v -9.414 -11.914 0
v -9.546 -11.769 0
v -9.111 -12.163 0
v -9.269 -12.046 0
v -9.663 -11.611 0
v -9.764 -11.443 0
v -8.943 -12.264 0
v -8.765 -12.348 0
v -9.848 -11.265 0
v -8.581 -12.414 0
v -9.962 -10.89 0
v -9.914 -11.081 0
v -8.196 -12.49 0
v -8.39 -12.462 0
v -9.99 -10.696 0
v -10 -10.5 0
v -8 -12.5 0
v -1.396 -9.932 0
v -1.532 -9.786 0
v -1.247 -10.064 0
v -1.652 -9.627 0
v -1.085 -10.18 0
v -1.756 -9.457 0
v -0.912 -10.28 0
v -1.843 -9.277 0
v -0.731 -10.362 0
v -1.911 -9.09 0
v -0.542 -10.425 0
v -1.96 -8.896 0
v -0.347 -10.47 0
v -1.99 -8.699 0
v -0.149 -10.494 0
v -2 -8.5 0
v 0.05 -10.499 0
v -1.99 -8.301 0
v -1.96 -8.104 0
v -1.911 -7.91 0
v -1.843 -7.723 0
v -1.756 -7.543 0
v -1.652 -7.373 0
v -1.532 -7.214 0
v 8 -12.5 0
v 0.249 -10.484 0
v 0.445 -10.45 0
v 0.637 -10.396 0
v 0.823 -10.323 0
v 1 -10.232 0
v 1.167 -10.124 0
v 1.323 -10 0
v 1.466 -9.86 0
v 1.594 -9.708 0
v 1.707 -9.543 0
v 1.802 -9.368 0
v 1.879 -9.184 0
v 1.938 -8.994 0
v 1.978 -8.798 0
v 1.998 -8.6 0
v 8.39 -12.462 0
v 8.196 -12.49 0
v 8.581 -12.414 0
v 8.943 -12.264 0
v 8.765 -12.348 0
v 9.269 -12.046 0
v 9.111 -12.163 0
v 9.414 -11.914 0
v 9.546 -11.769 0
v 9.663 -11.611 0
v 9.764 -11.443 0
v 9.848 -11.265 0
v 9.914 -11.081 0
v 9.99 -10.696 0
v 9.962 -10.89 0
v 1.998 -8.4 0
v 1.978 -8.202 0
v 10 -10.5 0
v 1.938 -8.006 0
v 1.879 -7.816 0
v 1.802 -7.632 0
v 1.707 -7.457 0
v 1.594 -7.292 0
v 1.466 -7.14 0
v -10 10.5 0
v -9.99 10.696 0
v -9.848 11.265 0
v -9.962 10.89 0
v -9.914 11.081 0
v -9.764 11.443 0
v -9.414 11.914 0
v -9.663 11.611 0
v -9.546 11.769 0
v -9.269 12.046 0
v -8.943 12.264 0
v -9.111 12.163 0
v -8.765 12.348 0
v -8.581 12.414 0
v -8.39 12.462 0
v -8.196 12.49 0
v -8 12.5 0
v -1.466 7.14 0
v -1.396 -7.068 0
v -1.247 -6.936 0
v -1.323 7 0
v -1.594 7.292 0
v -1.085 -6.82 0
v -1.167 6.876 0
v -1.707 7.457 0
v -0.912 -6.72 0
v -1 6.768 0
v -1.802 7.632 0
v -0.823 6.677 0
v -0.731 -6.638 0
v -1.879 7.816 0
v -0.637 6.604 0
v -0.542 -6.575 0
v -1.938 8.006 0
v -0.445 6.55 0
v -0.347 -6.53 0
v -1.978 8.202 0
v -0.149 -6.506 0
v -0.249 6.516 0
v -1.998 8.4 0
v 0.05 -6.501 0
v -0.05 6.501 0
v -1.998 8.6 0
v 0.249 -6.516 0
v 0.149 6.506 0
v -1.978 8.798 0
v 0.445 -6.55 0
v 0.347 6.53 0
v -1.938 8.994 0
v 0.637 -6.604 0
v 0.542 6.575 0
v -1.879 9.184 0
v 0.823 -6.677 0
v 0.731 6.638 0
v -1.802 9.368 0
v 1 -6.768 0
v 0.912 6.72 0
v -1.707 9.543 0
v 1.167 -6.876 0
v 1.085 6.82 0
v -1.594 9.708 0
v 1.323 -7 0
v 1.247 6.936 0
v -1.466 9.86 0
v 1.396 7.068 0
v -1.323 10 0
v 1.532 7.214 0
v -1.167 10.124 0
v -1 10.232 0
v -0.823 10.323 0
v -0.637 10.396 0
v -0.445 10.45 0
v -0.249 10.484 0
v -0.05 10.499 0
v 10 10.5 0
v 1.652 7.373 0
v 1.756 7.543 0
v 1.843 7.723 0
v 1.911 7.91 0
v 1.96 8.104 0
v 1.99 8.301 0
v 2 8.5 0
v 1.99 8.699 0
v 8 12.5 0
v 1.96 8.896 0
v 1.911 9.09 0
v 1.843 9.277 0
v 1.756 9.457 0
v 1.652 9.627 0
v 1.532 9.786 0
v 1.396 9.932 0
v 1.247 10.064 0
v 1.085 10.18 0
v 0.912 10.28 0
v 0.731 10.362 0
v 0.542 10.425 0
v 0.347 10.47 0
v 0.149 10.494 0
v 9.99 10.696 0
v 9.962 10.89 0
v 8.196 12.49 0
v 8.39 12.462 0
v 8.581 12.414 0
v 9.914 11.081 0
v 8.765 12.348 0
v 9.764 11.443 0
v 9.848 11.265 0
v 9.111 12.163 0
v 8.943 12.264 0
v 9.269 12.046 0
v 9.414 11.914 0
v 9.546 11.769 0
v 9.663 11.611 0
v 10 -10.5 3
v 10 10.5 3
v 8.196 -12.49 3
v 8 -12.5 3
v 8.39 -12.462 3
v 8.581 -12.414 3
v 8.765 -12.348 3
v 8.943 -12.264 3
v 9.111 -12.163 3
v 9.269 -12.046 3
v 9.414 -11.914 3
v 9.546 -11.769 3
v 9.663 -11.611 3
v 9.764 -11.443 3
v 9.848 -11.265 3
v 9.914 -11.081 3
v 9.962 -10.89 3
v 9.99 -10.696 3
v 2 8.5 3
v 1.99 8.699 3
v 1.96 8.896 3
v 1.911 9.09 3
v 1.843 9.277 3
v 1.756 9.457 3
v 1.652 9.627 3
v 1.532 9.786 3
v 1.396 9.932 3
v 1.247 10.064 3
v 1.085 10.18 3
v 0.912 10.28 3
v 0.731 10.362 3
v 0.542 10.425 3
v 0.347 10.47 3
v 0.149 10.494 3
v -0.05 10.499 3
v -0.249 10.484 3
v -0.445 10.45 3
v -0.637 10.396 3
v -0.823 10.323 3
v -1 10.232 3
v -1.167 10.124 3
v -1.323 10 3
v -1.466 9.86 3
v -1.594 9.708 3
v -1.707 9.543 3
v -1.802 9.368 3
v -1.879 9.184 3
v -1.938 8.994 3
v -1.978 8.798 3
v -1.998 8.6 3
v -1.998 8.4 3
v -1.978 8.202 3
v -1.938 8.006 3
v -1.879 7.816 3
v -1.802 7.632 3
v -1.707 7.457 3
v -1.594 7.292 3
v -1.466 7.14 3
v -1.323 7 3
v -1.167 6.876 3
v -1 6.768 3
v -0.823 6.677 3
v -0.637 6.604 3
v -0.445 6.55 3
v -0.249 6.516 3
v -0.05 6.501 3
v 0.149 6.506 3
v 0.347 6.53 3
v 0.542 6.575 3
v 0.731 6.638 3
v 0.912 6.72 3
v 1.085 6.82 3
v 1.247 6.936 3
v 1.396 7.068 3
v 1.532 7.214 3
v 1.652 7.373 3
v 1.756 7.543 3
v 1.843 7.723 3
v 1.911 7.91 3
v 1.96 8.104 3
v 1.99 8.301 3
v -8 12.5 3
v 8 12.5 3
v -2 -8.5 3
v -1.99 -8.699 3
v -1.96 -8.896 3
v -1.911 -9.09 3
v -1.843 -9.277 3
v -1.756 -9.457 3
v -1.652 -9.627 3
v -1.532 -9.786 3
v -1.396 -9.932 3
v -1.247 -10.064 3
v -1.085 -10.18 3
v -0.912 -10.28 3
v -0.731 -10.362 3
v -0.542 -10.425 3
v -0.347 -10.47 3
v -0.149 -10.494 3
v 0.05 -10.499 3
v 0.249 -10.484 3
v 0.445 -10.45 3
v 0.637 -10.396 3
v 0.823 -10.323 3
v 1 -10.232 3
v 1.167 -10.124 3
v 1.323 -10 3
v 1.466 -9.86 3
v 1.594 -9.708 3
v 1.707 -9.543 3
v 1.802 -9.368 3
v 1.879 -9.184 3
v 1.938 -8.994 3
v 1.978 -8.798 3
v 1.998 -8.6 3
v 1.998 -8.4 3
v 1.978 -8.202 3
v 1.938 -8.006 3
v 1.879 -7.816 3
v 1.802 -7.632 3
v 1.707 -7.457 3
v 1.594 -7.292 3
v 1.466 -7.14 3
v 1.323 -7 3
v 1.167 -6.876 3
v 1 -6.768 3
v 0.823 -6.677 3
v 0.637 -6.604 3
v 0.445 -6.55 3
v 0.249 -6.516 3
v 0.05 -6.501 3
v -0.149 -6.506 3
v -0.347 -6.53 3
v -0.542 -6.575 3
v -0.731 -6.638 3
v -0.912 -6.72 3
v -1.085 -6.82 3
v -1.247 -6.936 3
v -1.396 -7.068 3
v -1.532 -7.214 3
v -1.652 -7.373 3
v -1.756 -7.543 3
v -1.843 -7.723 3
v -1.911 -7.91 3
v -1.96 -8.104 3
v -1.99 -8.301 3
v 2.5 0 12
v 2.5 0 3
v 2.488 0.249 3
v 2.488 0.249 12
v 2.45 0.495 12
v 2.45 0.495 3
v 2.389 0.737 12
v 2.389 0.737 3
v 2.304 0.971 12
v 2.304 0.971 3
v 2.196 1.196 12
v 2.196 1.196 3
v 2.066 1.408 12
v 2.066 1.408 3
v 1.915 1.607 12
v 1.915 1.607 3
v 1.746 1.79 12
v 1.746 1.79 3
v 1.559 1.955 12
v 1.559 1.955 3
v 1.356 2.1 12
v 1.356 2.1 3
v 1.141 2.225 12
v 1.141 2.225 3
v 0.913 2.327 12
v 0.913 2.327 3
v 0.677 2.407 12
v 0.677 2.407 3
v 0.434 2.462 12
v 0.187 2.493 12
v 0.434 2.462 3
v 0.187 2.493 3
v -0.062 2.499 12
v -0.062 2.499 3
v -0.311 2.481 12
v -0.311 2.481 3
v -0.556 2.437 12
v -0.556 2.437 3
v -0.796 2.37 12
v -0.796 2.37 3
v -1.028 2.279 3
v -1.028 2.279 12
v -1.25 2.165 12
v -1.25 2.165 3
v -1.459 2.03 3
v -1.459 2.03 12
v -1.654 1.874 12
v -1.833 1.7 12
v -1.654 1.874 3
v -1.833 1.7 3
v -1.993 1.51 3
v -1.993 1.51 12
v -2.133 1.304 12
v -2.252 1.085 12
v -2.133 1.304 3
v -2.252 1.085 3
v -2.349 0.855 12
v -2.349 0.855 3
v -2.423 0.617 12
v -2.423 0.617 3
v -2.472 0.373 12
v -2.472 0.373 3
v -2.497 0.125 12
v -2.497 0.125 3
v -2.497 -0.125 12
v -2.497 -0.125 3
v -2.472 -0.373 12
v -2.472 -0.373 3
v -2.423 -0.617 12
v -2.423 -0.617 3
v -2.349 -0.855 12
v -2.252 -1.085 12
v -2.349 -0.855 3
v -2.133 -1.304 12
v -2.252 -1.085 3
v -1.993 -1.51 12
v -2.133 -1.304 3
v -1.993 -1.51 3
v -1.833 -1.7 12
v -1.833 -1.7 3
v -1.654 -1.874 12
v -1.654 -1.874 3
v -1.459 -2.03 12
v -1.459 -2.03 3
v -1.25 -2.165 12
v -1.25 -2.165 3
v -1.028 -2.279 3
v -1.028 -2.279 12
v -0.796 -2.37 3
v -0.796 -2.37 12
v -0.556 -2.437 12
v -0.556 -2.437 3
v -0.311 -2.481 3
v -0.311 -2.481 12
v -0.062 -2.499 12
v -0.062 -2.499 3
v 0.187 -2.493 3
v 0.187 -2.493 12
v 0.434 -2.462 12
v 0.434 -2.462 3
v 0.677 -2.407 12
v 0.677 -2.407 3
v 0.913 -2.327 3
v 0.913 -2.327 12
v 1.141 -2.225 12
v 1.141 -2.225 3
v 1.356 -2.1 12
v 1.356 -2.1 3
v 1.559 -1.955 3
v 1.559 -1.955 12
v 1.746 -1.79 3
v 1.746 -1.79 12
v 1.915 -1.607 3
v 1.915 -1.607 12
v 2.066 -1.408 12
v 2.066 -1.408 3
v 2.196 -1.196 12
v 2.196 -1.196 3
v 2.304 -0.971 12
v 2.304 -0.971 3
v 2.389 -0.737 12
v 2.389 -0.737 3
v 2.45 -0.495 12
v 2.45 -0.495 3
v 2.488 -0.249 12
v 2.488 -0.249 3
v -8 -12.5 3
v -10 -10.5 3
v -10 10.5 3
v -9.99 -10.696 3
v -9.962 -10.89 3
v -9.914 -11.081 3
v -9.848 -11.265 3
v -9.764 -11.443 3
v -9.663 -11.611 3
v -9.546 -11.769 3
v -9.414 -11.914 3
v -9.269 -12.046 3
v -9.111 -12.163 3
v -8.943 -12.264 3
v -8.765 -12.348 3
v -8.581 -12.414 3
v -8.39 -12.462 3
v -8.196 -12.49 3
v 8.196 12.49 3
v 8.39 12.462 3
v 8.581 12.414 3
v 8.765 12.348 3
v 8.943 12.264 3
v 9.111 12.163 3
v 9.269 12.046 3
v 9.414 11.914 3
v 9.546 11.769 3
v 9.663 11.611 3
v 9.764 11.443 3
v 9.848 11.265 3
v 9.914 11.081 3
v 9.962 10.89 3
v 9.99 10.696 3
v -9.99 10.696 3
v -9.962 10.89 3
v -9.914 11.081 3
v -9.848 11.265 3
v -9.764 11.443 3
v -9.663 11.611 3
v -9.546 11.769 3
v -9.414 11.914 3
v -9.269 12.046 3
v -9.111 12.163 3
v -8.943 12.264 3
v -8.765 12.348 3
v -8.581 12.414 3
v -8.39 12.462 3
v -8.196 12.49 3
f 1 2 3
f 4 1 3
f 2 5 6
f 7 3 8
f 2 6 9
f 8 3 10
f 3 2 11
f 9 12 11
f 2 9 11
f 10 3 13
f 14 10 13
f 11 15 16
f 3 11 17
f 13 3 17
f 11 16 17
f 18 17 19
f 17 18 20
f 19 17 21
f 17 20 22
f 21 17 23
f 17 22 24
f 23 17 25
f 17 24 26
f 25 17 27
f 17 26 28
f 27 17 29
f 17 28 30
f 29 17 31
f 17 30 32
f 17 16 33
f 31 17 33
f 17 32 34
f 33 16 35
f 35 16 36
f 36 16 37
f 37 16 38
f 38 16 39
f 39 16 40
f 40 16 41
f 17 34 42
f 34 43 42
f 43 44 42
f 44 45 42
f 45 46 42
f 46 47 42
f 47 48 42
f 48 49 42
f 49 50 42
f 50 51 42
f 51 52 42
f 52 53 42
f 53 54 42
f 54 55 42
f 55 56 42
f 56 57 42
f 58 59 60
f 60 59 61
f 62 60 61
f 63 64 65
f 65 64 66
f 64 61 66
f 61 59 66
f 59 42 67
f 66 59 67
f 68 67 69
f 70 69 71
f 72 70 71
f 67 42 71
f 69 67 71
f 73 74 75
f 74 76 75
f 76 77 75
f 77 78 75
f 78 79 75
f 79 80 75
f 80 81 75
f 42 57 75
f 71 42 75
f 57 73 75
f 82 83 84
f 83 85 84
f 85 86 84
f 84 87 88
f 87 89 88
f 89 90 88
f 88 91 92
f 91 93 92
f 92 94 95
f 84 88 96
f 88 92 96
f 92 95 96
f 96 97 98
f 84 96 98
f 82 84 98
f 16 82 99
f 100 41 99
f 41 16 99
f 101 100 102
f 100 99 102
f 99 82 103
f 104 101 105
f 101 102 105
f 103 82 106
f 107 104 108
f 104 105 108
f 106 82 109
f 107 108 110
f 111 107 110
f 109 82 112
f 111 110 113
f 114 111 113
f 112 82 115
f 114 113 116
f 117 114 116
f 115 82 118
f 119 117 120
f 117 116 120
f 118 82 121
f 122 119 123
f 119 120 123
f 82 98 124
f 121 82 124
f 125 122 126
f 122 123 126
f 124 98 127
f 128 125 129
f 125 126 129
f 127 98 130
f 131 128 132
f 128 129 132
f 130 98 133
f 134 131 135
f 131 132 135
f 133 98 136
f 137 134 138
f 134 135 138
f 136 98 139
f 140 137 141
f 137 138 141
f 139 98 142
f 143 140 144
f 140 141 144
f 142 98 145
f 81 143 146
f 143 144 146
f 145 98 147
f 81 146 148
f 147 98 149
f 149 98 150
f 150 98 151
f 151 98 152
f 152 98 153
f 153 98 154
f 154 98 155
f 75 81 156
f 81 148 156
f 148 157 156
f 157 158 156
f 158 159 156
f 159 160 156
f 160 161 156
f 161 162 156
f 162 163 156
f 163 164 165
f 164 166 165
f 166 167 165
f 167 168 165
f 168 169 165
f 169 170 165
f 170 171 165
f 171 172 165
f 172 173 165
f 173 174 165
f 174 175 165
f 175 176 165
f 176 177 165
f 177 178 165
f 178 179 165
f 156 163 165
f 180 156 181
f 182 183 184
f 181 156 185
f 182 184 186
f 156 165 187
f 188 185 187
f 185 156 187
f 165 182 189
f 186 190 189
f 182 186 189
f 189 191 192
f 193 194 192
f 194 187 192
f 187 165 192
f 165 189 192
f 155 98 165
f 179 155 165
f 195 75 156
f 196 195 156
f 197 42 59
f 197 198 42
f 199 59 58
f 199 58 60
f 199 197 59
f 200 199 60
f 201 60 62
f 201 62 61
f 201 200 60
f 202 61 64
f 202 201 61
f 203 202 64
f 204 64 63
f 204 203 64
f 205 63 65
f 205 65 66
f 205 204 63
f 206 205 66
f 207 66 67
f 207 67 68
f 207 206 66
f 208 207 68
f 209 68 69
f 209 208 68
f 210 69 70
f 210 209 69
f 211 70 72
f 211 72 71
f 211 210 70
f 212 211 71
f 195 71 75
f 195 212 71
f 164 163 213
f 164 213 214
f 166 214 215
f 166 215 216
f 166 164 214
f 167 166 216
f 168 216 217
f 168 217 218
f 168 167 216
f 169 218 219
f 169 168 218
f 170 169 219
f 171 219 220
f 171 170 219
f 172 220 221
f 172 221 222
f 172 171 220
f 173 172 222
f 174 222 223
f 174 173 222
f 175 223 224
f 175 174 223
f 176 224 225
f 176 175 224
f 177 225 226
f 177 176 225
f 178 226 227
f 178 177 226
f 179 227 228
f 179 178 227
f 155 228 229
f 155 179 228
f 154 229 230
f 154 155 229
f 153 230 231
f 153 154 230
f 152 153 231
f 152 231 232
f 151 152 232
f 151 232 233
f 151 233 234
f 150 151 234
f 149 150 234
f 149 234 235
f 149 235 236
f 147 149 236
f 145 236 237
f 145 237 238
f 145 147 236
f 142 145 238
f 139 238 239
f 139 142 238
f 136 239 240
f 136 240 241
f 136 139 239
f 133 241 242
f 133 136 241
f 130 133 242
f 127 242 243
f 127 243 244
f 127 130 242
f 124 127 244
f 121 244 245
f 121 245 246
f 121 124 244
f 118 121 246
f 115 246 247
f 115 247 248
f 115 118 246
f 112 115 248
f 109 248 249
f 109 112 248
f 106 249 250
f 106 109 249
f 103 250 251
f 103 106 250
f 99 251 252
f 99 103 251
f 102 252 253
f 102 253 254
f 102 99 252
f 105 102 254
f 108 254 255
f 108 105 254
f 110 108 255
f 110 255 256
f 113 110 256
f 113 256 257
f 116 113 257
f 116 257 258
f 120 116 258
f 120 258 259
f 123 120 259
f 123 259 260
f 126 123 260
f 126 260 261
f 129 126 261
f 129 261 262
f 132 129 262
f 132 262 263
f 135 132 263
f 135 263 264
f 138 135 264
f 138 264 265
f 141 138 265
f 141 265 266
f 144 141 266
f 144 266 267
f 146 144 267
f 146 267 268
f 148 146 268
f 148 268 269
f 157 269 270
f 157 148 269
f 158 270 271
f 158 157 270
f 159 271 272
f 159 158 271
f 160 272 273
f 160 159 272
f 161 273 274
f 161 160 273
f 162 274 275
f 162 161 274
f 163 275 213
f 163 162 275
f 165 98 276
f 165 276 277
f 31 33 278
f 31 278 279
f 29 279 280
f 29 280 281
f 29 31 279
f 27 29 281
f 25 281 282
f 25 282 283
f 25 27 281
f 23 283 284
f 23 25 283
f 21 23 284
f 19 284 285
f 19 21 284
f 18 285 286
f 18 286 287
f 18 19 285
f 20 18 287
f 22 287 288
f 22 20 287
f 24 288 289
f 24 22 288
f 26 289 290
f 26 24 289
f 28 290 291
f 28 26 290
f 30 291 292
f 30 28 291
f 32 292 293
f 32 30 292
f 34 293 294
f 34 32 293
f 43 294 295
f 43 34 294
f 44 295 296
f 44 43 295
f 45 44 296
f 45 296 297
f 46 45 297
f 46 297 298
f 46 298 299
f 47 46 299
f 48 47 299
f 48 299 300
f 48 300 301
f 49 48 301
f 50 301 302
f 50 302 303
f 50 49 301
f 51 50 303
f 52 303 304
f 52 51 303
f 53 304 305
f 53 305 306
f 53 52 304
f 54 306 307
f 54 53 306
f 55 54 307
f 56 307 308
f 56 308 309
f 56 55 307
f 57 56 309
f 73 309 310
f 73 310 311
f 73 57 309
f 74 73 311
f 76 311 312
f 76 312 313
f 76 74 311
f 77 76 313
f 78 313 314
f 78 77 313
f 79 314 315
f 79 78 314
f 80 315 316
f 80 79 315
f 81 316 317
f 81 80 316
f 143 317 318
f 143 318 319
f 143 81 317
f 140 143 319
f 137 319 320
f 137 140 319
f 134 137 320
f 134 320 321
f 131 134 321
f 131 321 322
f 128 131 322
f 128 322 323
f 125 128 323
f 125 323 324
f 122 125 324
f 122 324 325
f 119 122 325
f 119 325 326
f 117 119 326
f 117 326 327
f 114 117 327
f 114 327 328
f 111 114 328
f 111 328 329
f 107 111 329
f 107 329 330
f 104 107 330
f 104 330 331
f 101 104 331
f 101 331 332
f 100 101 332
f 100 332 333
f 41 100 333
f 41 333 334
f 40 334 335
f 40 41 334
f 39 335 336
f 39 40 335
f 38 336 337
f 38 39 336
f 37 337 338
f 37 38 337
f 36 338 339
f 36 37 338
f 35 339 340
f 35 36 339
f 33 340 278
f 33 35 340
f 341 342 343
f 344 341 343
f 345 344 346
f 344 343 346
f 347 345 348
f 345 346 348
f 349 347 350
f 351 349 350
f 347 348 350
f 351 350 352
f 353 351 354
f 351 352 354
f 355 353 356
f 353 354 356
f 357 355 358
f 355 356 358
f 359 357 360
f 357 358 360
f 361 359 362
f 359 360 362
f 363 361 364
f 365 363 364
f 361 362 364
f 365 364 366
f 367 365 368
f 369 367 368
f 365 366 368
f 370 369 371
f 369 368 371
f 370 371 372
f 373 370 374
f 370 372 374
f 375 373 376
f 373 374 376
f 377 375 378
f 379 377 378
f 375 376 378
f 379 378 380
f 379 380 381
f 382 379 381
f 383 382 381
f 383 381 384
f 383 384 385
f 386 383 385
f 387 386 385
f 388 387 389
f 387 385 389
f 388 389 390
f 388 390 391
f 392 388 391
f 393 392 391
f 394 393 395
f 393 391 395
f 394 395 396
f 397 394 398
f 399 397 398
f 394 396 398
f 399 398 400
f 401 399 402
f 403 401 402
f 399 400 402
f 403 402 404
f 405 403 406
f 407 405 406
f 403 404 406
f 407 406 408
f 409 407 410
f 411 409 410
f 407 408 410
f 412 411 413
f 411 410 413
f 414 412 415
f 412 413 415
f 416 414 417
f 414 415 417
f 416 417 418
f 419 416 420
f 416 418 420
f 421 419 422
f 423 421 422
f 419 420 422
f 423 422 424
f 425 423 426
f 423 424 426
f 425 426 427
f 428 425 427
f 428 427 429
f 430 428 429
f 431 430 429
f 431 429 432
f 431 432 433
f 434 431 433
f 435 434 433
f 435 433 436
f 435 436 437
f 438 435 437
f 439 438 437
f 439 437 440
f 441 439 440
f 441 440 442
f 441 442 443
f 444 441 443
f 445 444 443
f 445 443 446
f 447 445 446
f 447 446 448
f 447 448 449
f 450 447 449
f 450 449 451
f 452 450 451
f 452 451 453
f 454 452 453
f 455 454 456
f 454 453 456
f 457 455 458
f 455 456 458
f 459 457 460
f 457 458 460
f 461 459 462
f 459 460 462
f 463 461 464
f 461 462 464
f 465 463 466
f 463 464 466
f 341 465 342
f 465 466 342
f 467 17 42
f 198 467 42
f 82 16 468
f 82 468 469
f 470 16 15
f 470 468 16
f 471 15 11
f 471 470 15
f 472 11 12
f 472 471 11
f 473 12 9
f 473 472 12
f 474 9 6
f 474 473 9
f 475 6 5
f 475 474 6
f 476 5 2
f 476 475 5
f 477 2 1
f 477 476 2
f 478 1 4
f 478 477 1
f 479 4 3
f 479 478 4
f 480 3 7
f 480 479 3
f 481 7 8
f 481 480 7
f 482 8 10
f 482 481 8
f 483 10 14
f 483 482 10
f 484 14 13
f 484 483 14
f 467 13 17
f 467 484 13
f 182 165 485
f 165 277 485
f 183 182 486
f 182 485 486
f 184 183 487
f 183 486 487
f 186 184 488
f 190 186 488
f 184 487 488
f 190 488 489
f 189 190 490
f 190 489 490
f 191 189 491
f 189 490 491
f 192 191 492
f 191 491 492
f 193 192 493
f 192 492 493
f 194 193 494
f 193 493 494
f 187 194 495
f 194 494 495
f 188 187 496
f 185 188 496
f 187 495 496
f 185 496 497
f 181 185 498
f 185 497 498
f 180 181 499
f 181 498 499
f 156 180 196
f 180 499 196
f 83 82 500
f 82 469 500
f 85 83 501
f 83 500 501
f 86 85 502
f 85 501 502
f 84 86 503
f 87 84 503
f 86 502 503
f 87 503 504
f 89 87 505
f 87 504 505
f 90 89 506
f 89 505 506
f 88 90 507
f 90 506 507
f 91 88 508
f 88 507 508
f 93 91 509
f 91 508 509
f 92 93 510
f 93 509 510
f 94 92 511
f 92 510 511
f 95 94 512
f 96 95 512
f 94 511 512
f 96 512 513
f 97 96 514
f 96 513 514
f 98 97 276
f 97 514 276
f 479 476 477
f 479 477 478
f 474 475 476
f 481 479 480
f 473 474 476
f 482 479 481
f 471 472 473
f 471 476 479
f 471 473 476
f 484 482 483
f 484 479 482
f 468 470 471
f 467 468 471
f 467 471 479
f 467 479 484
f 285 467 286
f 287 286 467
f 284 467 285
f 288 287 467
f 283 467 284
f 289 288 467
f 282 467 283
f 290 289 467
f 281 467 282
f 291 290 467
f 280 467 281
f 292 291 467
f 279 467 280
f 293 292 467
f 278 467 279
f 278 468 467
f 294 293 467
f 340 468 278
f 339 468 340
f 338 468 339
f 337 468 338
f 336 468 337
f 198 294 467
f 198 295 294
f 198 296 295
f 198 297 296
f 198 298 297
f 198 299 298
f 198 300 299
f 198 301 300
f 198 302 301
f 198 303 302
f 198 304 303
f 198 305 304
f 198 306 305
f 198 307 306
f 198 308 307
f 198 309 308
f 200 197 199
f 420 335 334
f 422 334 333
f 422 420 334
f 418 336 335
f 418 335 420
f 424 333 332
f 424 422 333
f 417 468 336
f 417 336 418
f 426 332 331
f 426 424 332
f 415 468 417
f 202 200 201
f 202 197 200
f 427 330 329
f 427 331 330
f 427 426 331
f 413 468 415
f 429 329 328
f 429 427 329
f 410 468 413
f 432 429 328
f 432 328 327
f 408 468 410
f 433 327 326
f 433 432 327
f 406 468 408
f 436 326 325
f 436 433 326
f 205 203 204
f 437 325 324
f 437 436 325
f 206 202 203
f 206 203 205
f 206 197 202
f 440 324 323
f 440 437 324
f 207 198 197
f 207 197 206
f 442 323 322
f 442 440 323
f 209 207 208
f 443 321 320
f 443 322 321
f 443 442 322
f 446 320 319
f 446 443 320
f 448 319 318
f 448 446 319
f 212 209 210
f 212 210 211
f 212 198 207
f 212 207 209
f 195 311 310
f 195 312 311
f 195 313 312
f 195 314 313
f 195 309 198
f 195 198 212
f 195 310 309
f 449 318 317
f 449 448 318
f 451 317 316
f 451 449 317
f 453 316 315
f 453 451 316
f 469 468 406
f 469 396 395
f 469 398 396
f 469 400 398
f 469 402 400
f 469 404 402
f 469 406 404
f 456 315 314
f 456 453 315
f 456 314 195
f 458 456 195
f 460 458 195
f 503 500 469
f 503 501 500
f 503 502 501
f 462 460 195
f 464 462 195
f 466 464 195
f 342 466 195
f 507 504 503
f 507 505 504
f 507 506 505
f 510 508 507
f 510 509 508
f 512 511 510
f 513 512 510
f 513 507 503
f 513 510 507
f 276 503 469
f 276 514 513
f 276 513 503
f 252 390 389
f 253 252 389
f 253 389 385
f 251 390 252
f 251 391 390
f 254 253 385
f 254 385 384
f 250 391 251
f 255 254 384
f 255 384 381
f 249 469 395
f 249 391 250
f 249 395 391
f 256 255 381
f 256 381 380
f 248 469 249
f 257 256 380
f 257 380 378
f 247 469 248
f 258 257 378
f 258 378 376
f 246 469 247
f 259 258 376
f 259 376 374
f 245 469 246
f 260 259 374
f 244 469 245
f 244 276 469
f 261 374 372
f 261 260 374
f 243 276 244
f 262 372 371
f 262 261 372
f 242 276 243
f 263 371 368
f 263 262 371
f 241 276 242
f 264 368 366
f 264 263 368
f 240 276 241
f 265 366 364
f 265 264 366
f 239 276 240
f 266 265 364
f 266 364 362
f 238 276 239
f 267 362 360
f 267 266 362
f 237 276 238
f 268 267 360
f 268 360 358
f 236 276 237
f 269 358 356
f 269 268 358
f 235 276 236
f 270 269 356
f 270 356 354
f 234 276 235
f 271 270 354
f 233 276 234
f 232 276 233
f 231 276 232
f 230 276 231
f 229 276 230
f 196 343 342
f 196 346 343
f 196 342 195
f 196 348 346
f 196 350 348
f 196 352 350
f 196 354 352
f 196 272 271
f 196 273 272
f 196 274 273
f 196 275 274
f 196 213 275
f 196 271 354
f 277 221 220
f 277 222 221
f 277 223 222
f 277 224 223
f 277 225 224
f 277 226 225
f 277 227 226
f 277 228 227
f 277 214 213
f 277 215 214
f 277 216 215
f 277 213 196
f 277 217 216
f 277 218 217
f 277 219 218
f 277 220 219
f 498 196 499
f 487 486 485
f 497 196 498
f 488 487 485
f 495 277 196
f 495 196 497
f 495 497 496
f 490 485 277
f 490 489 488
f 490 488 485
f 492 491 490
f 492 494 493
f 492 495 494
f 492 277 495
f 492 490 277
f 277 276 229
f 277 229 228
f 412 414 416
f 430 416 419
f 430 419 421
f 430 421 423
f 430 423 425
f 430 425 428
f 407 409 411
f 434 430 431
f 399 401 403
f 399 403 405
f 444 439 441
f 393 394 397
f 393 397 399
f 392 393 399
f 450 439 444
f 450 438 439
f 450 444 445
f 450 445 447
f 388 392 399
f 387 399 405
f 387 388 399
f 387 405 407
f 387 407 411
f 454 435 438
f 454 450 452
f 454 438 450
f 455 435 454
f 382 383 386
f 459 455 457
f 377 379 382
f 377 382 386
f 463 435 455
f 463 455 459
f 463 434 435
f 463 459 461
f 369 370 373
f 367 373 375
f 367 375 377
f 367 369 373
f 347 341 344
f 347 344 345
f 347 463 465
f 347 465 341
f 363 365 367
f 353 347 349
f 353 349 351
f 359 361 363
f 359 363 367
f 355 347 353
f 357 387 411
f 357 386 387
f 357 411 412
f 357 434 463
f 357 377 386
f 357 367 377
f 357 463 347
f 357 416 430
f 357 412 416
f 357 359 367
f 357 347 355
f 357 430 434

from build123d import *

# Parameters (mm, degrees)
ESQUISSE1_W        = 20
ESQUISSE1_H        = 25
ESQUISSE1_R        = 2
BOSS_EXTRU_1_DEPTH = 3
CONG_1_R           = 2
ESQUISSE2_R        = 2.5
BOSS_EXTRU_3_DEPTH = 9


with BuildPart() as part:
    # Esquisse1 → Boss.-Extru.1 (new body)
    with BuildSketch(Plane.XY):
        Rectangle(ESQUISSE1_W, ESQUISSE1_H)
        with Locations((0, 8.5)):
            Circle(ESQUISSE1_R, mode=Mode.SUBTRACT)
        with Locations(Location((0, -8.5, 0), (0, 0, 180))):
            Circle(ESQUISSE1_R, mode=Mode.SUBTRACT)
    extrude(amount=BOSS_EXTRU_1_DEPTH)

    # Congé1
    cong_1_edges = [part.edges().sort_by_distance(p)[0] for p in [
        (-10, 12.5, 1.5),
        (10, 12.5, 1.5),
        (10, -12.5, 1.5),
        (-10, -12.5, 1.5),
    ]]
    fillet(cong_1_edges, radius=CONG_1_R)

    # Esquisse2 → Boss.-Extru.3 (add)
    with BuildSketch(Plane.XY.offset(3)):
        Circle(ESQUISSE2_R)
    extrude(amount=BOSS_EXTRU_3_DEPTH)


solid = part.part
